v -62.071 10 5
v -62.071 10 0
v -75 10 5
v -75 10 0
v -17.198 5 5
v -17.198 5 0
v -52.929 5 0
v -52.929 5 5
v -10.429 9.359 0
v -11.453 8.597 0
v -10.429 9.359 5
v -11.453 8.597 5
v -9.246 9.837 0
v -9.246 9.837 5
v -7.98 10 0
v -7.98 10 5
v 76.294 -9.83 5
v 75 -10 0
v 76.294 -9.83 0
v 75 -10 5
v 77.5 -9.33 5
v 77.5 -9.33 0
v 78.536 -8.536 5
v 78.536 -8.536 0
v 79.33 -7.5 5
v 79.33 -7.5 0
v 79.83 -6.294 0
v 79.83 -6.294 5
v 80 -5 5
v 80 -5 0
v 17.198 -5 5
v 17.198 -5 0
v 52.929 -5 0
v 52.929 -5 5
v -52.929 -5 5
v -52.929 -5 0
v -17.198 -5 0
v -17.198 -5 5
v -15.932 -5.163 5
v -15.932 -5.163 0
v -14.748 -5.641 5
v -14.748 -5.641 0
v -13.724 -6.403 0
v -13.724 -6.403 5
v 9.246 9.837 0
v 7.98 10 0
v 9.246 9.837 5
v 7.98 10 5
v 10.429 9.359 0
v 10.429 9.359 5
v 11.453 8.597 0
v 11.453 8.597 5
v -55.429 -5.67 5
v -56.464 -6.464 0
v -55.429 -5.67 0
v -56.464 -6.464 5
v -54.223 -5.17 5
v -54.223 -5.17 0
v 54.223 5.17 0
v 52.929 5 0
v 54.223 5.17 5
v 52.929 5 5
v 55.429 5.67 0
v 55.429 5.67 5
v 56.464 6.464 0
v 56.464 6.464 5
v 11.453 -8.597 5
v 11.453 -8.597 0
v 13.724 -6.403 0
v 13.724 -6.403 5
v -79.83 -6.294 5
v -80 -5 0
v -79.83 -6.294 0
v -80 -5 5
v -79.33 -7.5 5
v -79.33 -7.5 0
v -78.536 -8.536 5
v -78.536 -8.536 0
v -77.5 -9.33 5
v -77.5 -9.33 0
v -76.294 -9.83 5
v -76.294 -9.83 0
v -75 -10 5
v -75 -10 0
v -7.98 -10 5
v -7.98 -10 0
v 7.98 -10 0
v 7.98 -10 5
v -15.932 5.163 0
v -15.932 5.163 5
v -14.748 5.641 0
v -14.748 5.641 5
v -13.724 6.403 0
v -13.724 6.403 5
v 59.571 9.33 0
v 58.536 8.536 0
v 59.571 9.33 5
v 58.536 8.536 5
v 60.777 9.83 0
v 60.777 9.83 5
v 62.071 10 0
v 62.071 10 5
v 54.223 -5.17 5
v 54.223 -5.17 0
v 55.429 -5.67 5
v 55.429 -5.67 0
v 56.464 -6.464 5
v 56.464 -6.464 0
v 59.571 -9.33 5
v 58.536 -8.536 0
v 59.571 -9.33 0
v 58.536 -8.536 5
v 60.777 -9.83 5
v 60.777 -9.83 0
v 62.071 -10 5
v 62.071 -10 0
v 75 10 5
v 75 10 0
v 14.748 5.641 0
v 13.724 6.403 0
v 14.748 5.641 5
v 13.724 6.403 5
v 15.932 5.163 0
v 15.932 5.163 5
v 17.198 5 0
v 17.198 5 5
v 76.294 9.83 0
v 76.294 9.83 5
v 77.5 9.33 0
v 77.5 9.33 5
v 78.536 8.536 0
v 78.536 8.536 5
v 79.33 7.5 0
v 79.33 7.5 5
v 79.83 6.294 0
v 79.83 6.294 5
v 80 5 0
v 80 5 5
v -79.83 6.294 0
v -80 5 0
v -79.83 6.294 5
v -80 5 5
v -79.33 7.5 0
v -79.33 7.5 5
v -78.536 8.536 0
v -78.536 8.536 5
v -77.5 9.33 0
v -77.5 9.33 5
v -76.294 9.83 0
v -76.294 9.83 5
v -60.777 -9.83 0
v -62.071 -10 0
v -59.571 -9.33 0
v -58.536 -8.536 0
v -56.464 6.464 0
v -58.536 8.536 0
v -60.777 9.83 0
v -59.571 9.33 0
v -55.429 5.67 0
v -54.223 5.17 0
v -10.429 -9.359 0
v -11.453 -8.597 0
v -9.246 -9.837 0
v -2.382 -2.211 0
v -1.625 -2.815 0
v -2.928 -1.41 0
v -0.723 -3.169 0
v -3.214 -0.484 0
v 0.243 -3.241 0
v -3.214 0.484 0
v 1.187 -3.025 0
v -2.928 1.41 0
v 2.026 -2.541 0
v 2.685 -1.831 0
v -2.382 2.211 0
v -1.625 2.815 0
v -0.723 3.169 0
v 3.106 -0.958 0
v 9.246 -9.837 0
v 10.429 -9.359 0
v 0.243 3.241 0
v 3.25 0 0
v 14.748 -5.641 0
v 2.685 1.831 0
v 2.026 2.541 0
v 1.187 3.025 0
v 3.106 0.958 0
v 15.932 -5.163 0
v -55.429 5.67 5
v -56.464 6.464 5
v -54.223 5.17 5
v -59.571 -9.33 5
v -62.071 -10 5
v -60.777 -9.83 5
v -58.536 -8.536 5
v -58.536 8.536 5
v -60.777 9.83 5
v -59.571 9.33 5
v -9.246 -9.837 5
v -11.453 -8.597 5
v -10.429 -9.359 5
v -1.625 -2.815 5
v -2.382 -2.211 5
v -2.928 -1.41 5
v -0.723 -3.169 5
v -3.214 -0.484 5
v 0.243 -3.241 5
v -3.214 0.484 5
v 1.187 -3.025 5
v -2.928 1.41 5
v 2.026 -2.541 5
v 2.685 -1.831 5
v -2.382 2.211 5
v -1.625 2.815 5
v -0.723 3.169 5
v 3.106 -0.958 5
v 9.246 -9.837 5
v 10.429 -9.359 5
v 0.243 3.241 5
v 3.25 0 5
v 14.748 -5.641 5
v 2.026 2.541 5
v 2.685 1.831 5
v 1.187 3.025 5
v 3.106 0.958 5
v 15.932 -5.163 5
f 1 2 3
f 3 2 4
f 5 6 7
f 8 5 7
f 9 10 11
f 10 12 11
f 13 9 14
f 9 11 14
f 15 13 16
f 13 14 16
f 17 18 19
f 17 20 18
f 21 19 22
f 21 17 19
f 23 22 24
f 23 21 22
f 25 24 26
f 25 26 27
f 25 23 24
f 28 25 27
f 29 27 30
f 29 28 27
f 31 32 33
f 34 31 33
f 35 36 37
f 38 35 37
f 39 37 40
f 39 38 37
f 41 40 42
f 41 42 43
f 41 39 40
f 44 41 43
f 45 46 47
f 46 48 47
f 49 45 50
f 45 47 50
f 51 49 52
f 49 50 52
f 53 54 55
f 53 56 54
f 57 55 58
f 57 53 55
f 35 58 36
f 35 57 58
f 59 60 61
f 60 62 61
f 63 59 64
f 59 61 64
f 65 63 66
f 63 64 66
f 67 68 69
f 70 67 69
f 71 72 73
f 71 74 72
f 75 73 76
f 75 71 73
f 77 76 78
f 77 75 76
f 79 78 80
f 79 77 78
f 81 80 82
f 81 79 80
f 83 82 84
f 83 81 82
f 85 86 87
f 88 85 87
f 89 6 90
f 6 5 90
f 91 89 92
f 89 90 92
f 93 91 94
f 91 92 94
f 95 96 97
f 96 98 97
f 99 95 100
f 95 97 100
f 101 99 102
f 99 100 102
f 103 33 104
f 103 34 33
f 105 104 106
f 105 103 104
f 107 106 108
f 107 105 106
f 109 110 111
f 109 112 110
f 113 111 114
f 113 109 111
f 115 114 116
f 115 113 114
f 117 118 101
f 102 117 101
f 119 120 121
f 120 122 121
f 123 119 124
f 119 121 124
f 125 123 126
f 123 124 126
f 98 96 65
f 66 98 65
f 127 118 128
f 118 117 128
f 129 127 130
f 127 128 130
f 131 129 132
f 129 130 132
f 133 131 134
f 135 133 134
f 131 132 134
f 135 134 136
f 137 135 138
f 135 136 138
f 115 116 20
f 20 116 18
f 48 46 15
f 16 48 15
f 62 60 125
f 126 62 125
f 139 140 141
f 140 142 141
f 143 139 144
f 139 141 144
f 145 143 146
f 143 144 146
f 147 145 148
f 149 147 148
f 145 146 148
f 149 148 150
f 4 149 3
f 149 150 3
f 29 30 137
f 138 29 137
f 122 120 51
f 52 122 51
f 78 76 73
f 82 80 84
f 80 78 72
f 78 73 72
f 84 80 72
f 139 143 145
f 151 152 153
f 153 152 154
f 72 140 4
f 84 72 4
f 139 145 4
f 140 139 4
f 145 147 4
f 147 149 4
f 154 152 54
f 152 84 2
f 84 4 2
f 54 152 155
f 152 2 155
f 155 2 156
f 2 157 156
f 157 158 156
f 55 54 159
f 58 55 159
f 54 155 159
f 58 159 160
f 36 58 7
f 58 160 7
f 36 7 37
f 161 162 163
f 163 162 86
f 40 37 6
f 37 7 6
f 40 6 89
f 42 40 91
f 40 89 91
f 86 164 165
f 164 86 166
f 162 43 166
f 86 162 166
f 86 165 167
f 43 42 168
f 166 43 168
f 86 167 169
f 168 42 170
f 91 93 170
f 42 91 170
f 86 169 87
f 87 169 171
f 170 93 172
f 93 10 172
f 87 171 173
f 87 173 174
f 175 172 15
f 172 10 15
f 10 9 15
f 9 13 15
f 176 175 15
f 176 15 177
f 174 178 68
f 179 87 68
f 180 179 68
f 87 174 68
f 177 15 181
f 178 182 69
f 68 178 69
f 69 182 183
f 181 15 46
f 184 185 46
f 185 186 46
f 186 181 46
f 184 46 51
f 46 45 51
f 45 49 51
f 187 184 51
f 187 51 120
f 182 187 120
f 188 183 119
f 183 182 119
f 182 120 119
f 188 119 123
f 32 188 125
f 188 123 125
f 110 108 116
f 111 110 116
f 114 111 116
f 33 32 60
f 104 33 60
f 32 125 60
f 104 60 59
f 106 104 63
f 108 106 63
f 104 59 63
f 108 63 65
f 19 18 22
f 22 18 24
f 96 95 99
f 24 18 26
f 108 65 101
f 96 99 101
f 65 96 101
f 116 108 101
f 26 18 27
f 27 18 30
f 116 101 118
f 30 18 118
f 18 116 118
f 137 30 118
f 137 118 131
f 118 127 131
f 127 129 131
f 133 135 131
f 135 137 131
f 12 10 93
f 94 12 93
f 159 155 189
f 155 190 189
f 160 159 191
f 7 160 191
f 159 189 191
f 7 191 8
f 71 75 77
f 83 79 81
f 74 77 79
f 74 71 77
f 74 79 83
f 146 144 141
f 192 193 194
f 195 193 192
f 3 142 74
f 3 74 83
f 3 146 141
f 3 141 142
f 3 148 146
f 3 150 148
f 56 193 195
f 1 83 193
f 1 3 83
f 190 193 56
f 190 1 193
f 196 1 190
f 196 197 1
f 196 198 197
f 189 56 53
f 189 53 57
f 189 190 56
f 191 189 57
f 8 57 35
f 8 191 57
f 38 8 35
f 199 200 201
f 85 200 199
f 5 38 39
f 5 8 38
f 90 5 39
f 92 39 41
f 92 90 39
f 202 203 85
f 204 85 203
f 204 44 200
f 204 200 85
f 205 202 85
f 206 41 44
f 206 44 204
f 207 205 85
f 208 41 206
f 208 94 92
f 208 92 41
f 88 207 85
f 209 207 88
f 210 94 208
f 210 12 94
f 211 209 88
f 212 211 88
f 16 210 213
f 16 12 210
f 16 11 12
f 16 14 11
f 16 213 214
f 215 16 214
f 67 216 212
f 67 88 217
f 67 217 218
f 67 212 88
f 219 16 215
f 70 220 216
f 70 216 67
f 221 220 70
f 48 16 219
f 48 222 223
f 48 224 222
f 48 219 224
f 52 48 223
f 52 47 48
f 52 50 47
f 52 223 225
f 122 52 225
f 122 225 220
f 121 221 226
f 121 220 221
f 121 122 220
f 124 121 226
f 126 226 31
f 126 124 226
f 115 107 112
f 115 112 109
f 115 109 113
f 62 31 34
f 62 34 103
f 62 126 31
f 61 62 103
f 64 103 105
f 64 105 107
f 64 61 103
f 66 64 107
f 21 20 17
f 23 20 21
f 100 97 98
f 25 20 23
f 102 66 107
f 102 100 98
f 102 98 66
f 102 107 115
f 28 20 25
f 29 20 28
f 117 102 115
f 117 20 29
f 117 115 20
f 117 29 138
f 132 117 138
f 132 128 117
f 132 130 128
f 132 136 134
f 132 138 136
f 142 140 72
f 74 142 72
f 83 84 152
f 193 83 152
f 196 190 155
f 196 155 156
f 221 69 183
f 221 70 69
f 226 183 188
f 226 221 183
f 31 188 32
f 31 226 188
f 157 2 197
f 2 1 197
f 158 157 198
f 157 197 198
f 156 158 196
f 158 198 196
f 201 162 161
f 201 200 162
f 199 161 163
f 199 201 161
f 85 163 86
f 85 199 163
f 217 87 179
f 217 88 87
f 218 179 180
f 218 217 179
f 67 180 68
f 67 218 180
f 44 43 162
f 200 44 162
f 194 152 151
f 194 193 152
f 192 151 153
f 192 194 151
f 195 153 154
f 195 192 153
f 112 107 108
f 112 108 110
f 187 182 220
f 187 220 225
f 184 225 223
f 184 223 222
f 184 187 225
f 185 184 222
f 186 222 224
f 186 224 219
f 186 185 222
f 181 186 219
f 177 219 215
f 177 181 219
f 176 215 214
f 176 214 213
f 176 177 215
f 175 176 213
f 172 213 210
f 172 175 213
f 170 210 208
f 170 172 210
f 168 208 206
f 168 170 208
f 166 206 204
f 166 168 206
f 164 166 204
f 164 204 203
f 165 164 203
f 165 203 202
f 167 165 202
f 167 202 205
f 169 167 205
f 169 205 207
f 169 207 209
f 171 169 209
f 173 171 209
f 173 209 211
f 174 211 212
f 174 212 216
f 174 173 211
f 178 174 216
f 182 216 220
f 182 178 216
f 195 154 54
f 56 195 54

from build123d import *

# Parameters (mm, degrees)
F0_R     = 3.25
F1_DEPTH = 5
F2_R     = 5


with BuildPart() as f1:
    # F0 (on Top) → F1 (new body)
    with BuildSketch(Plane.XY):
        Polygon((-80, 10), (-80, -10), (-60, -10), (-55, -5), (-15.177652, -5), (-10, -10), (10, -10), (15.177652, -5), (55, -5), (60, -10), (80, -10), (80, 10), (60, 10), (55, 5), (15.177652, 5), (10, 10), (-10, 10), (-15.177652, 5), (-55, 5), (-60, 10), align=None)
        Circle(F0_R, mode=Mode.SUBTRACT)
    extrude(amount=F1_DEPTH)

    # F2
    f2_edges = [f1.edges().sort_by_distance(p)[0] for p in [
        (-80, -10, 2.5),
        (-55, -5, 2.5),
        (-10, -10, 2.5),
        (10, -10, 2.5),
        (15.177652, -5, 2.5),
        (60, -10, 2.5),
        (80, -10, 2.5),
        (80, 10, 2.5),
        (60, 10, 2.5),
        (10, 10, 2.5),
        (15.177652, 5, 2.5),
        (-55, 5, 2.5),
        (-60, 10, 2.5),
        (-80, 10, 2.5),
        (-10, 10, 2.5),
        (55, 5, 2.5),
        (-15.177652, 5, 2.5),
        (-15.177652, -5, 2.5),
        (55, -5, 2.5),
        (-60, -10, 2.5),
    ]]
    fillet(f2_edges, radius=F2_R)


solid = f1.part
